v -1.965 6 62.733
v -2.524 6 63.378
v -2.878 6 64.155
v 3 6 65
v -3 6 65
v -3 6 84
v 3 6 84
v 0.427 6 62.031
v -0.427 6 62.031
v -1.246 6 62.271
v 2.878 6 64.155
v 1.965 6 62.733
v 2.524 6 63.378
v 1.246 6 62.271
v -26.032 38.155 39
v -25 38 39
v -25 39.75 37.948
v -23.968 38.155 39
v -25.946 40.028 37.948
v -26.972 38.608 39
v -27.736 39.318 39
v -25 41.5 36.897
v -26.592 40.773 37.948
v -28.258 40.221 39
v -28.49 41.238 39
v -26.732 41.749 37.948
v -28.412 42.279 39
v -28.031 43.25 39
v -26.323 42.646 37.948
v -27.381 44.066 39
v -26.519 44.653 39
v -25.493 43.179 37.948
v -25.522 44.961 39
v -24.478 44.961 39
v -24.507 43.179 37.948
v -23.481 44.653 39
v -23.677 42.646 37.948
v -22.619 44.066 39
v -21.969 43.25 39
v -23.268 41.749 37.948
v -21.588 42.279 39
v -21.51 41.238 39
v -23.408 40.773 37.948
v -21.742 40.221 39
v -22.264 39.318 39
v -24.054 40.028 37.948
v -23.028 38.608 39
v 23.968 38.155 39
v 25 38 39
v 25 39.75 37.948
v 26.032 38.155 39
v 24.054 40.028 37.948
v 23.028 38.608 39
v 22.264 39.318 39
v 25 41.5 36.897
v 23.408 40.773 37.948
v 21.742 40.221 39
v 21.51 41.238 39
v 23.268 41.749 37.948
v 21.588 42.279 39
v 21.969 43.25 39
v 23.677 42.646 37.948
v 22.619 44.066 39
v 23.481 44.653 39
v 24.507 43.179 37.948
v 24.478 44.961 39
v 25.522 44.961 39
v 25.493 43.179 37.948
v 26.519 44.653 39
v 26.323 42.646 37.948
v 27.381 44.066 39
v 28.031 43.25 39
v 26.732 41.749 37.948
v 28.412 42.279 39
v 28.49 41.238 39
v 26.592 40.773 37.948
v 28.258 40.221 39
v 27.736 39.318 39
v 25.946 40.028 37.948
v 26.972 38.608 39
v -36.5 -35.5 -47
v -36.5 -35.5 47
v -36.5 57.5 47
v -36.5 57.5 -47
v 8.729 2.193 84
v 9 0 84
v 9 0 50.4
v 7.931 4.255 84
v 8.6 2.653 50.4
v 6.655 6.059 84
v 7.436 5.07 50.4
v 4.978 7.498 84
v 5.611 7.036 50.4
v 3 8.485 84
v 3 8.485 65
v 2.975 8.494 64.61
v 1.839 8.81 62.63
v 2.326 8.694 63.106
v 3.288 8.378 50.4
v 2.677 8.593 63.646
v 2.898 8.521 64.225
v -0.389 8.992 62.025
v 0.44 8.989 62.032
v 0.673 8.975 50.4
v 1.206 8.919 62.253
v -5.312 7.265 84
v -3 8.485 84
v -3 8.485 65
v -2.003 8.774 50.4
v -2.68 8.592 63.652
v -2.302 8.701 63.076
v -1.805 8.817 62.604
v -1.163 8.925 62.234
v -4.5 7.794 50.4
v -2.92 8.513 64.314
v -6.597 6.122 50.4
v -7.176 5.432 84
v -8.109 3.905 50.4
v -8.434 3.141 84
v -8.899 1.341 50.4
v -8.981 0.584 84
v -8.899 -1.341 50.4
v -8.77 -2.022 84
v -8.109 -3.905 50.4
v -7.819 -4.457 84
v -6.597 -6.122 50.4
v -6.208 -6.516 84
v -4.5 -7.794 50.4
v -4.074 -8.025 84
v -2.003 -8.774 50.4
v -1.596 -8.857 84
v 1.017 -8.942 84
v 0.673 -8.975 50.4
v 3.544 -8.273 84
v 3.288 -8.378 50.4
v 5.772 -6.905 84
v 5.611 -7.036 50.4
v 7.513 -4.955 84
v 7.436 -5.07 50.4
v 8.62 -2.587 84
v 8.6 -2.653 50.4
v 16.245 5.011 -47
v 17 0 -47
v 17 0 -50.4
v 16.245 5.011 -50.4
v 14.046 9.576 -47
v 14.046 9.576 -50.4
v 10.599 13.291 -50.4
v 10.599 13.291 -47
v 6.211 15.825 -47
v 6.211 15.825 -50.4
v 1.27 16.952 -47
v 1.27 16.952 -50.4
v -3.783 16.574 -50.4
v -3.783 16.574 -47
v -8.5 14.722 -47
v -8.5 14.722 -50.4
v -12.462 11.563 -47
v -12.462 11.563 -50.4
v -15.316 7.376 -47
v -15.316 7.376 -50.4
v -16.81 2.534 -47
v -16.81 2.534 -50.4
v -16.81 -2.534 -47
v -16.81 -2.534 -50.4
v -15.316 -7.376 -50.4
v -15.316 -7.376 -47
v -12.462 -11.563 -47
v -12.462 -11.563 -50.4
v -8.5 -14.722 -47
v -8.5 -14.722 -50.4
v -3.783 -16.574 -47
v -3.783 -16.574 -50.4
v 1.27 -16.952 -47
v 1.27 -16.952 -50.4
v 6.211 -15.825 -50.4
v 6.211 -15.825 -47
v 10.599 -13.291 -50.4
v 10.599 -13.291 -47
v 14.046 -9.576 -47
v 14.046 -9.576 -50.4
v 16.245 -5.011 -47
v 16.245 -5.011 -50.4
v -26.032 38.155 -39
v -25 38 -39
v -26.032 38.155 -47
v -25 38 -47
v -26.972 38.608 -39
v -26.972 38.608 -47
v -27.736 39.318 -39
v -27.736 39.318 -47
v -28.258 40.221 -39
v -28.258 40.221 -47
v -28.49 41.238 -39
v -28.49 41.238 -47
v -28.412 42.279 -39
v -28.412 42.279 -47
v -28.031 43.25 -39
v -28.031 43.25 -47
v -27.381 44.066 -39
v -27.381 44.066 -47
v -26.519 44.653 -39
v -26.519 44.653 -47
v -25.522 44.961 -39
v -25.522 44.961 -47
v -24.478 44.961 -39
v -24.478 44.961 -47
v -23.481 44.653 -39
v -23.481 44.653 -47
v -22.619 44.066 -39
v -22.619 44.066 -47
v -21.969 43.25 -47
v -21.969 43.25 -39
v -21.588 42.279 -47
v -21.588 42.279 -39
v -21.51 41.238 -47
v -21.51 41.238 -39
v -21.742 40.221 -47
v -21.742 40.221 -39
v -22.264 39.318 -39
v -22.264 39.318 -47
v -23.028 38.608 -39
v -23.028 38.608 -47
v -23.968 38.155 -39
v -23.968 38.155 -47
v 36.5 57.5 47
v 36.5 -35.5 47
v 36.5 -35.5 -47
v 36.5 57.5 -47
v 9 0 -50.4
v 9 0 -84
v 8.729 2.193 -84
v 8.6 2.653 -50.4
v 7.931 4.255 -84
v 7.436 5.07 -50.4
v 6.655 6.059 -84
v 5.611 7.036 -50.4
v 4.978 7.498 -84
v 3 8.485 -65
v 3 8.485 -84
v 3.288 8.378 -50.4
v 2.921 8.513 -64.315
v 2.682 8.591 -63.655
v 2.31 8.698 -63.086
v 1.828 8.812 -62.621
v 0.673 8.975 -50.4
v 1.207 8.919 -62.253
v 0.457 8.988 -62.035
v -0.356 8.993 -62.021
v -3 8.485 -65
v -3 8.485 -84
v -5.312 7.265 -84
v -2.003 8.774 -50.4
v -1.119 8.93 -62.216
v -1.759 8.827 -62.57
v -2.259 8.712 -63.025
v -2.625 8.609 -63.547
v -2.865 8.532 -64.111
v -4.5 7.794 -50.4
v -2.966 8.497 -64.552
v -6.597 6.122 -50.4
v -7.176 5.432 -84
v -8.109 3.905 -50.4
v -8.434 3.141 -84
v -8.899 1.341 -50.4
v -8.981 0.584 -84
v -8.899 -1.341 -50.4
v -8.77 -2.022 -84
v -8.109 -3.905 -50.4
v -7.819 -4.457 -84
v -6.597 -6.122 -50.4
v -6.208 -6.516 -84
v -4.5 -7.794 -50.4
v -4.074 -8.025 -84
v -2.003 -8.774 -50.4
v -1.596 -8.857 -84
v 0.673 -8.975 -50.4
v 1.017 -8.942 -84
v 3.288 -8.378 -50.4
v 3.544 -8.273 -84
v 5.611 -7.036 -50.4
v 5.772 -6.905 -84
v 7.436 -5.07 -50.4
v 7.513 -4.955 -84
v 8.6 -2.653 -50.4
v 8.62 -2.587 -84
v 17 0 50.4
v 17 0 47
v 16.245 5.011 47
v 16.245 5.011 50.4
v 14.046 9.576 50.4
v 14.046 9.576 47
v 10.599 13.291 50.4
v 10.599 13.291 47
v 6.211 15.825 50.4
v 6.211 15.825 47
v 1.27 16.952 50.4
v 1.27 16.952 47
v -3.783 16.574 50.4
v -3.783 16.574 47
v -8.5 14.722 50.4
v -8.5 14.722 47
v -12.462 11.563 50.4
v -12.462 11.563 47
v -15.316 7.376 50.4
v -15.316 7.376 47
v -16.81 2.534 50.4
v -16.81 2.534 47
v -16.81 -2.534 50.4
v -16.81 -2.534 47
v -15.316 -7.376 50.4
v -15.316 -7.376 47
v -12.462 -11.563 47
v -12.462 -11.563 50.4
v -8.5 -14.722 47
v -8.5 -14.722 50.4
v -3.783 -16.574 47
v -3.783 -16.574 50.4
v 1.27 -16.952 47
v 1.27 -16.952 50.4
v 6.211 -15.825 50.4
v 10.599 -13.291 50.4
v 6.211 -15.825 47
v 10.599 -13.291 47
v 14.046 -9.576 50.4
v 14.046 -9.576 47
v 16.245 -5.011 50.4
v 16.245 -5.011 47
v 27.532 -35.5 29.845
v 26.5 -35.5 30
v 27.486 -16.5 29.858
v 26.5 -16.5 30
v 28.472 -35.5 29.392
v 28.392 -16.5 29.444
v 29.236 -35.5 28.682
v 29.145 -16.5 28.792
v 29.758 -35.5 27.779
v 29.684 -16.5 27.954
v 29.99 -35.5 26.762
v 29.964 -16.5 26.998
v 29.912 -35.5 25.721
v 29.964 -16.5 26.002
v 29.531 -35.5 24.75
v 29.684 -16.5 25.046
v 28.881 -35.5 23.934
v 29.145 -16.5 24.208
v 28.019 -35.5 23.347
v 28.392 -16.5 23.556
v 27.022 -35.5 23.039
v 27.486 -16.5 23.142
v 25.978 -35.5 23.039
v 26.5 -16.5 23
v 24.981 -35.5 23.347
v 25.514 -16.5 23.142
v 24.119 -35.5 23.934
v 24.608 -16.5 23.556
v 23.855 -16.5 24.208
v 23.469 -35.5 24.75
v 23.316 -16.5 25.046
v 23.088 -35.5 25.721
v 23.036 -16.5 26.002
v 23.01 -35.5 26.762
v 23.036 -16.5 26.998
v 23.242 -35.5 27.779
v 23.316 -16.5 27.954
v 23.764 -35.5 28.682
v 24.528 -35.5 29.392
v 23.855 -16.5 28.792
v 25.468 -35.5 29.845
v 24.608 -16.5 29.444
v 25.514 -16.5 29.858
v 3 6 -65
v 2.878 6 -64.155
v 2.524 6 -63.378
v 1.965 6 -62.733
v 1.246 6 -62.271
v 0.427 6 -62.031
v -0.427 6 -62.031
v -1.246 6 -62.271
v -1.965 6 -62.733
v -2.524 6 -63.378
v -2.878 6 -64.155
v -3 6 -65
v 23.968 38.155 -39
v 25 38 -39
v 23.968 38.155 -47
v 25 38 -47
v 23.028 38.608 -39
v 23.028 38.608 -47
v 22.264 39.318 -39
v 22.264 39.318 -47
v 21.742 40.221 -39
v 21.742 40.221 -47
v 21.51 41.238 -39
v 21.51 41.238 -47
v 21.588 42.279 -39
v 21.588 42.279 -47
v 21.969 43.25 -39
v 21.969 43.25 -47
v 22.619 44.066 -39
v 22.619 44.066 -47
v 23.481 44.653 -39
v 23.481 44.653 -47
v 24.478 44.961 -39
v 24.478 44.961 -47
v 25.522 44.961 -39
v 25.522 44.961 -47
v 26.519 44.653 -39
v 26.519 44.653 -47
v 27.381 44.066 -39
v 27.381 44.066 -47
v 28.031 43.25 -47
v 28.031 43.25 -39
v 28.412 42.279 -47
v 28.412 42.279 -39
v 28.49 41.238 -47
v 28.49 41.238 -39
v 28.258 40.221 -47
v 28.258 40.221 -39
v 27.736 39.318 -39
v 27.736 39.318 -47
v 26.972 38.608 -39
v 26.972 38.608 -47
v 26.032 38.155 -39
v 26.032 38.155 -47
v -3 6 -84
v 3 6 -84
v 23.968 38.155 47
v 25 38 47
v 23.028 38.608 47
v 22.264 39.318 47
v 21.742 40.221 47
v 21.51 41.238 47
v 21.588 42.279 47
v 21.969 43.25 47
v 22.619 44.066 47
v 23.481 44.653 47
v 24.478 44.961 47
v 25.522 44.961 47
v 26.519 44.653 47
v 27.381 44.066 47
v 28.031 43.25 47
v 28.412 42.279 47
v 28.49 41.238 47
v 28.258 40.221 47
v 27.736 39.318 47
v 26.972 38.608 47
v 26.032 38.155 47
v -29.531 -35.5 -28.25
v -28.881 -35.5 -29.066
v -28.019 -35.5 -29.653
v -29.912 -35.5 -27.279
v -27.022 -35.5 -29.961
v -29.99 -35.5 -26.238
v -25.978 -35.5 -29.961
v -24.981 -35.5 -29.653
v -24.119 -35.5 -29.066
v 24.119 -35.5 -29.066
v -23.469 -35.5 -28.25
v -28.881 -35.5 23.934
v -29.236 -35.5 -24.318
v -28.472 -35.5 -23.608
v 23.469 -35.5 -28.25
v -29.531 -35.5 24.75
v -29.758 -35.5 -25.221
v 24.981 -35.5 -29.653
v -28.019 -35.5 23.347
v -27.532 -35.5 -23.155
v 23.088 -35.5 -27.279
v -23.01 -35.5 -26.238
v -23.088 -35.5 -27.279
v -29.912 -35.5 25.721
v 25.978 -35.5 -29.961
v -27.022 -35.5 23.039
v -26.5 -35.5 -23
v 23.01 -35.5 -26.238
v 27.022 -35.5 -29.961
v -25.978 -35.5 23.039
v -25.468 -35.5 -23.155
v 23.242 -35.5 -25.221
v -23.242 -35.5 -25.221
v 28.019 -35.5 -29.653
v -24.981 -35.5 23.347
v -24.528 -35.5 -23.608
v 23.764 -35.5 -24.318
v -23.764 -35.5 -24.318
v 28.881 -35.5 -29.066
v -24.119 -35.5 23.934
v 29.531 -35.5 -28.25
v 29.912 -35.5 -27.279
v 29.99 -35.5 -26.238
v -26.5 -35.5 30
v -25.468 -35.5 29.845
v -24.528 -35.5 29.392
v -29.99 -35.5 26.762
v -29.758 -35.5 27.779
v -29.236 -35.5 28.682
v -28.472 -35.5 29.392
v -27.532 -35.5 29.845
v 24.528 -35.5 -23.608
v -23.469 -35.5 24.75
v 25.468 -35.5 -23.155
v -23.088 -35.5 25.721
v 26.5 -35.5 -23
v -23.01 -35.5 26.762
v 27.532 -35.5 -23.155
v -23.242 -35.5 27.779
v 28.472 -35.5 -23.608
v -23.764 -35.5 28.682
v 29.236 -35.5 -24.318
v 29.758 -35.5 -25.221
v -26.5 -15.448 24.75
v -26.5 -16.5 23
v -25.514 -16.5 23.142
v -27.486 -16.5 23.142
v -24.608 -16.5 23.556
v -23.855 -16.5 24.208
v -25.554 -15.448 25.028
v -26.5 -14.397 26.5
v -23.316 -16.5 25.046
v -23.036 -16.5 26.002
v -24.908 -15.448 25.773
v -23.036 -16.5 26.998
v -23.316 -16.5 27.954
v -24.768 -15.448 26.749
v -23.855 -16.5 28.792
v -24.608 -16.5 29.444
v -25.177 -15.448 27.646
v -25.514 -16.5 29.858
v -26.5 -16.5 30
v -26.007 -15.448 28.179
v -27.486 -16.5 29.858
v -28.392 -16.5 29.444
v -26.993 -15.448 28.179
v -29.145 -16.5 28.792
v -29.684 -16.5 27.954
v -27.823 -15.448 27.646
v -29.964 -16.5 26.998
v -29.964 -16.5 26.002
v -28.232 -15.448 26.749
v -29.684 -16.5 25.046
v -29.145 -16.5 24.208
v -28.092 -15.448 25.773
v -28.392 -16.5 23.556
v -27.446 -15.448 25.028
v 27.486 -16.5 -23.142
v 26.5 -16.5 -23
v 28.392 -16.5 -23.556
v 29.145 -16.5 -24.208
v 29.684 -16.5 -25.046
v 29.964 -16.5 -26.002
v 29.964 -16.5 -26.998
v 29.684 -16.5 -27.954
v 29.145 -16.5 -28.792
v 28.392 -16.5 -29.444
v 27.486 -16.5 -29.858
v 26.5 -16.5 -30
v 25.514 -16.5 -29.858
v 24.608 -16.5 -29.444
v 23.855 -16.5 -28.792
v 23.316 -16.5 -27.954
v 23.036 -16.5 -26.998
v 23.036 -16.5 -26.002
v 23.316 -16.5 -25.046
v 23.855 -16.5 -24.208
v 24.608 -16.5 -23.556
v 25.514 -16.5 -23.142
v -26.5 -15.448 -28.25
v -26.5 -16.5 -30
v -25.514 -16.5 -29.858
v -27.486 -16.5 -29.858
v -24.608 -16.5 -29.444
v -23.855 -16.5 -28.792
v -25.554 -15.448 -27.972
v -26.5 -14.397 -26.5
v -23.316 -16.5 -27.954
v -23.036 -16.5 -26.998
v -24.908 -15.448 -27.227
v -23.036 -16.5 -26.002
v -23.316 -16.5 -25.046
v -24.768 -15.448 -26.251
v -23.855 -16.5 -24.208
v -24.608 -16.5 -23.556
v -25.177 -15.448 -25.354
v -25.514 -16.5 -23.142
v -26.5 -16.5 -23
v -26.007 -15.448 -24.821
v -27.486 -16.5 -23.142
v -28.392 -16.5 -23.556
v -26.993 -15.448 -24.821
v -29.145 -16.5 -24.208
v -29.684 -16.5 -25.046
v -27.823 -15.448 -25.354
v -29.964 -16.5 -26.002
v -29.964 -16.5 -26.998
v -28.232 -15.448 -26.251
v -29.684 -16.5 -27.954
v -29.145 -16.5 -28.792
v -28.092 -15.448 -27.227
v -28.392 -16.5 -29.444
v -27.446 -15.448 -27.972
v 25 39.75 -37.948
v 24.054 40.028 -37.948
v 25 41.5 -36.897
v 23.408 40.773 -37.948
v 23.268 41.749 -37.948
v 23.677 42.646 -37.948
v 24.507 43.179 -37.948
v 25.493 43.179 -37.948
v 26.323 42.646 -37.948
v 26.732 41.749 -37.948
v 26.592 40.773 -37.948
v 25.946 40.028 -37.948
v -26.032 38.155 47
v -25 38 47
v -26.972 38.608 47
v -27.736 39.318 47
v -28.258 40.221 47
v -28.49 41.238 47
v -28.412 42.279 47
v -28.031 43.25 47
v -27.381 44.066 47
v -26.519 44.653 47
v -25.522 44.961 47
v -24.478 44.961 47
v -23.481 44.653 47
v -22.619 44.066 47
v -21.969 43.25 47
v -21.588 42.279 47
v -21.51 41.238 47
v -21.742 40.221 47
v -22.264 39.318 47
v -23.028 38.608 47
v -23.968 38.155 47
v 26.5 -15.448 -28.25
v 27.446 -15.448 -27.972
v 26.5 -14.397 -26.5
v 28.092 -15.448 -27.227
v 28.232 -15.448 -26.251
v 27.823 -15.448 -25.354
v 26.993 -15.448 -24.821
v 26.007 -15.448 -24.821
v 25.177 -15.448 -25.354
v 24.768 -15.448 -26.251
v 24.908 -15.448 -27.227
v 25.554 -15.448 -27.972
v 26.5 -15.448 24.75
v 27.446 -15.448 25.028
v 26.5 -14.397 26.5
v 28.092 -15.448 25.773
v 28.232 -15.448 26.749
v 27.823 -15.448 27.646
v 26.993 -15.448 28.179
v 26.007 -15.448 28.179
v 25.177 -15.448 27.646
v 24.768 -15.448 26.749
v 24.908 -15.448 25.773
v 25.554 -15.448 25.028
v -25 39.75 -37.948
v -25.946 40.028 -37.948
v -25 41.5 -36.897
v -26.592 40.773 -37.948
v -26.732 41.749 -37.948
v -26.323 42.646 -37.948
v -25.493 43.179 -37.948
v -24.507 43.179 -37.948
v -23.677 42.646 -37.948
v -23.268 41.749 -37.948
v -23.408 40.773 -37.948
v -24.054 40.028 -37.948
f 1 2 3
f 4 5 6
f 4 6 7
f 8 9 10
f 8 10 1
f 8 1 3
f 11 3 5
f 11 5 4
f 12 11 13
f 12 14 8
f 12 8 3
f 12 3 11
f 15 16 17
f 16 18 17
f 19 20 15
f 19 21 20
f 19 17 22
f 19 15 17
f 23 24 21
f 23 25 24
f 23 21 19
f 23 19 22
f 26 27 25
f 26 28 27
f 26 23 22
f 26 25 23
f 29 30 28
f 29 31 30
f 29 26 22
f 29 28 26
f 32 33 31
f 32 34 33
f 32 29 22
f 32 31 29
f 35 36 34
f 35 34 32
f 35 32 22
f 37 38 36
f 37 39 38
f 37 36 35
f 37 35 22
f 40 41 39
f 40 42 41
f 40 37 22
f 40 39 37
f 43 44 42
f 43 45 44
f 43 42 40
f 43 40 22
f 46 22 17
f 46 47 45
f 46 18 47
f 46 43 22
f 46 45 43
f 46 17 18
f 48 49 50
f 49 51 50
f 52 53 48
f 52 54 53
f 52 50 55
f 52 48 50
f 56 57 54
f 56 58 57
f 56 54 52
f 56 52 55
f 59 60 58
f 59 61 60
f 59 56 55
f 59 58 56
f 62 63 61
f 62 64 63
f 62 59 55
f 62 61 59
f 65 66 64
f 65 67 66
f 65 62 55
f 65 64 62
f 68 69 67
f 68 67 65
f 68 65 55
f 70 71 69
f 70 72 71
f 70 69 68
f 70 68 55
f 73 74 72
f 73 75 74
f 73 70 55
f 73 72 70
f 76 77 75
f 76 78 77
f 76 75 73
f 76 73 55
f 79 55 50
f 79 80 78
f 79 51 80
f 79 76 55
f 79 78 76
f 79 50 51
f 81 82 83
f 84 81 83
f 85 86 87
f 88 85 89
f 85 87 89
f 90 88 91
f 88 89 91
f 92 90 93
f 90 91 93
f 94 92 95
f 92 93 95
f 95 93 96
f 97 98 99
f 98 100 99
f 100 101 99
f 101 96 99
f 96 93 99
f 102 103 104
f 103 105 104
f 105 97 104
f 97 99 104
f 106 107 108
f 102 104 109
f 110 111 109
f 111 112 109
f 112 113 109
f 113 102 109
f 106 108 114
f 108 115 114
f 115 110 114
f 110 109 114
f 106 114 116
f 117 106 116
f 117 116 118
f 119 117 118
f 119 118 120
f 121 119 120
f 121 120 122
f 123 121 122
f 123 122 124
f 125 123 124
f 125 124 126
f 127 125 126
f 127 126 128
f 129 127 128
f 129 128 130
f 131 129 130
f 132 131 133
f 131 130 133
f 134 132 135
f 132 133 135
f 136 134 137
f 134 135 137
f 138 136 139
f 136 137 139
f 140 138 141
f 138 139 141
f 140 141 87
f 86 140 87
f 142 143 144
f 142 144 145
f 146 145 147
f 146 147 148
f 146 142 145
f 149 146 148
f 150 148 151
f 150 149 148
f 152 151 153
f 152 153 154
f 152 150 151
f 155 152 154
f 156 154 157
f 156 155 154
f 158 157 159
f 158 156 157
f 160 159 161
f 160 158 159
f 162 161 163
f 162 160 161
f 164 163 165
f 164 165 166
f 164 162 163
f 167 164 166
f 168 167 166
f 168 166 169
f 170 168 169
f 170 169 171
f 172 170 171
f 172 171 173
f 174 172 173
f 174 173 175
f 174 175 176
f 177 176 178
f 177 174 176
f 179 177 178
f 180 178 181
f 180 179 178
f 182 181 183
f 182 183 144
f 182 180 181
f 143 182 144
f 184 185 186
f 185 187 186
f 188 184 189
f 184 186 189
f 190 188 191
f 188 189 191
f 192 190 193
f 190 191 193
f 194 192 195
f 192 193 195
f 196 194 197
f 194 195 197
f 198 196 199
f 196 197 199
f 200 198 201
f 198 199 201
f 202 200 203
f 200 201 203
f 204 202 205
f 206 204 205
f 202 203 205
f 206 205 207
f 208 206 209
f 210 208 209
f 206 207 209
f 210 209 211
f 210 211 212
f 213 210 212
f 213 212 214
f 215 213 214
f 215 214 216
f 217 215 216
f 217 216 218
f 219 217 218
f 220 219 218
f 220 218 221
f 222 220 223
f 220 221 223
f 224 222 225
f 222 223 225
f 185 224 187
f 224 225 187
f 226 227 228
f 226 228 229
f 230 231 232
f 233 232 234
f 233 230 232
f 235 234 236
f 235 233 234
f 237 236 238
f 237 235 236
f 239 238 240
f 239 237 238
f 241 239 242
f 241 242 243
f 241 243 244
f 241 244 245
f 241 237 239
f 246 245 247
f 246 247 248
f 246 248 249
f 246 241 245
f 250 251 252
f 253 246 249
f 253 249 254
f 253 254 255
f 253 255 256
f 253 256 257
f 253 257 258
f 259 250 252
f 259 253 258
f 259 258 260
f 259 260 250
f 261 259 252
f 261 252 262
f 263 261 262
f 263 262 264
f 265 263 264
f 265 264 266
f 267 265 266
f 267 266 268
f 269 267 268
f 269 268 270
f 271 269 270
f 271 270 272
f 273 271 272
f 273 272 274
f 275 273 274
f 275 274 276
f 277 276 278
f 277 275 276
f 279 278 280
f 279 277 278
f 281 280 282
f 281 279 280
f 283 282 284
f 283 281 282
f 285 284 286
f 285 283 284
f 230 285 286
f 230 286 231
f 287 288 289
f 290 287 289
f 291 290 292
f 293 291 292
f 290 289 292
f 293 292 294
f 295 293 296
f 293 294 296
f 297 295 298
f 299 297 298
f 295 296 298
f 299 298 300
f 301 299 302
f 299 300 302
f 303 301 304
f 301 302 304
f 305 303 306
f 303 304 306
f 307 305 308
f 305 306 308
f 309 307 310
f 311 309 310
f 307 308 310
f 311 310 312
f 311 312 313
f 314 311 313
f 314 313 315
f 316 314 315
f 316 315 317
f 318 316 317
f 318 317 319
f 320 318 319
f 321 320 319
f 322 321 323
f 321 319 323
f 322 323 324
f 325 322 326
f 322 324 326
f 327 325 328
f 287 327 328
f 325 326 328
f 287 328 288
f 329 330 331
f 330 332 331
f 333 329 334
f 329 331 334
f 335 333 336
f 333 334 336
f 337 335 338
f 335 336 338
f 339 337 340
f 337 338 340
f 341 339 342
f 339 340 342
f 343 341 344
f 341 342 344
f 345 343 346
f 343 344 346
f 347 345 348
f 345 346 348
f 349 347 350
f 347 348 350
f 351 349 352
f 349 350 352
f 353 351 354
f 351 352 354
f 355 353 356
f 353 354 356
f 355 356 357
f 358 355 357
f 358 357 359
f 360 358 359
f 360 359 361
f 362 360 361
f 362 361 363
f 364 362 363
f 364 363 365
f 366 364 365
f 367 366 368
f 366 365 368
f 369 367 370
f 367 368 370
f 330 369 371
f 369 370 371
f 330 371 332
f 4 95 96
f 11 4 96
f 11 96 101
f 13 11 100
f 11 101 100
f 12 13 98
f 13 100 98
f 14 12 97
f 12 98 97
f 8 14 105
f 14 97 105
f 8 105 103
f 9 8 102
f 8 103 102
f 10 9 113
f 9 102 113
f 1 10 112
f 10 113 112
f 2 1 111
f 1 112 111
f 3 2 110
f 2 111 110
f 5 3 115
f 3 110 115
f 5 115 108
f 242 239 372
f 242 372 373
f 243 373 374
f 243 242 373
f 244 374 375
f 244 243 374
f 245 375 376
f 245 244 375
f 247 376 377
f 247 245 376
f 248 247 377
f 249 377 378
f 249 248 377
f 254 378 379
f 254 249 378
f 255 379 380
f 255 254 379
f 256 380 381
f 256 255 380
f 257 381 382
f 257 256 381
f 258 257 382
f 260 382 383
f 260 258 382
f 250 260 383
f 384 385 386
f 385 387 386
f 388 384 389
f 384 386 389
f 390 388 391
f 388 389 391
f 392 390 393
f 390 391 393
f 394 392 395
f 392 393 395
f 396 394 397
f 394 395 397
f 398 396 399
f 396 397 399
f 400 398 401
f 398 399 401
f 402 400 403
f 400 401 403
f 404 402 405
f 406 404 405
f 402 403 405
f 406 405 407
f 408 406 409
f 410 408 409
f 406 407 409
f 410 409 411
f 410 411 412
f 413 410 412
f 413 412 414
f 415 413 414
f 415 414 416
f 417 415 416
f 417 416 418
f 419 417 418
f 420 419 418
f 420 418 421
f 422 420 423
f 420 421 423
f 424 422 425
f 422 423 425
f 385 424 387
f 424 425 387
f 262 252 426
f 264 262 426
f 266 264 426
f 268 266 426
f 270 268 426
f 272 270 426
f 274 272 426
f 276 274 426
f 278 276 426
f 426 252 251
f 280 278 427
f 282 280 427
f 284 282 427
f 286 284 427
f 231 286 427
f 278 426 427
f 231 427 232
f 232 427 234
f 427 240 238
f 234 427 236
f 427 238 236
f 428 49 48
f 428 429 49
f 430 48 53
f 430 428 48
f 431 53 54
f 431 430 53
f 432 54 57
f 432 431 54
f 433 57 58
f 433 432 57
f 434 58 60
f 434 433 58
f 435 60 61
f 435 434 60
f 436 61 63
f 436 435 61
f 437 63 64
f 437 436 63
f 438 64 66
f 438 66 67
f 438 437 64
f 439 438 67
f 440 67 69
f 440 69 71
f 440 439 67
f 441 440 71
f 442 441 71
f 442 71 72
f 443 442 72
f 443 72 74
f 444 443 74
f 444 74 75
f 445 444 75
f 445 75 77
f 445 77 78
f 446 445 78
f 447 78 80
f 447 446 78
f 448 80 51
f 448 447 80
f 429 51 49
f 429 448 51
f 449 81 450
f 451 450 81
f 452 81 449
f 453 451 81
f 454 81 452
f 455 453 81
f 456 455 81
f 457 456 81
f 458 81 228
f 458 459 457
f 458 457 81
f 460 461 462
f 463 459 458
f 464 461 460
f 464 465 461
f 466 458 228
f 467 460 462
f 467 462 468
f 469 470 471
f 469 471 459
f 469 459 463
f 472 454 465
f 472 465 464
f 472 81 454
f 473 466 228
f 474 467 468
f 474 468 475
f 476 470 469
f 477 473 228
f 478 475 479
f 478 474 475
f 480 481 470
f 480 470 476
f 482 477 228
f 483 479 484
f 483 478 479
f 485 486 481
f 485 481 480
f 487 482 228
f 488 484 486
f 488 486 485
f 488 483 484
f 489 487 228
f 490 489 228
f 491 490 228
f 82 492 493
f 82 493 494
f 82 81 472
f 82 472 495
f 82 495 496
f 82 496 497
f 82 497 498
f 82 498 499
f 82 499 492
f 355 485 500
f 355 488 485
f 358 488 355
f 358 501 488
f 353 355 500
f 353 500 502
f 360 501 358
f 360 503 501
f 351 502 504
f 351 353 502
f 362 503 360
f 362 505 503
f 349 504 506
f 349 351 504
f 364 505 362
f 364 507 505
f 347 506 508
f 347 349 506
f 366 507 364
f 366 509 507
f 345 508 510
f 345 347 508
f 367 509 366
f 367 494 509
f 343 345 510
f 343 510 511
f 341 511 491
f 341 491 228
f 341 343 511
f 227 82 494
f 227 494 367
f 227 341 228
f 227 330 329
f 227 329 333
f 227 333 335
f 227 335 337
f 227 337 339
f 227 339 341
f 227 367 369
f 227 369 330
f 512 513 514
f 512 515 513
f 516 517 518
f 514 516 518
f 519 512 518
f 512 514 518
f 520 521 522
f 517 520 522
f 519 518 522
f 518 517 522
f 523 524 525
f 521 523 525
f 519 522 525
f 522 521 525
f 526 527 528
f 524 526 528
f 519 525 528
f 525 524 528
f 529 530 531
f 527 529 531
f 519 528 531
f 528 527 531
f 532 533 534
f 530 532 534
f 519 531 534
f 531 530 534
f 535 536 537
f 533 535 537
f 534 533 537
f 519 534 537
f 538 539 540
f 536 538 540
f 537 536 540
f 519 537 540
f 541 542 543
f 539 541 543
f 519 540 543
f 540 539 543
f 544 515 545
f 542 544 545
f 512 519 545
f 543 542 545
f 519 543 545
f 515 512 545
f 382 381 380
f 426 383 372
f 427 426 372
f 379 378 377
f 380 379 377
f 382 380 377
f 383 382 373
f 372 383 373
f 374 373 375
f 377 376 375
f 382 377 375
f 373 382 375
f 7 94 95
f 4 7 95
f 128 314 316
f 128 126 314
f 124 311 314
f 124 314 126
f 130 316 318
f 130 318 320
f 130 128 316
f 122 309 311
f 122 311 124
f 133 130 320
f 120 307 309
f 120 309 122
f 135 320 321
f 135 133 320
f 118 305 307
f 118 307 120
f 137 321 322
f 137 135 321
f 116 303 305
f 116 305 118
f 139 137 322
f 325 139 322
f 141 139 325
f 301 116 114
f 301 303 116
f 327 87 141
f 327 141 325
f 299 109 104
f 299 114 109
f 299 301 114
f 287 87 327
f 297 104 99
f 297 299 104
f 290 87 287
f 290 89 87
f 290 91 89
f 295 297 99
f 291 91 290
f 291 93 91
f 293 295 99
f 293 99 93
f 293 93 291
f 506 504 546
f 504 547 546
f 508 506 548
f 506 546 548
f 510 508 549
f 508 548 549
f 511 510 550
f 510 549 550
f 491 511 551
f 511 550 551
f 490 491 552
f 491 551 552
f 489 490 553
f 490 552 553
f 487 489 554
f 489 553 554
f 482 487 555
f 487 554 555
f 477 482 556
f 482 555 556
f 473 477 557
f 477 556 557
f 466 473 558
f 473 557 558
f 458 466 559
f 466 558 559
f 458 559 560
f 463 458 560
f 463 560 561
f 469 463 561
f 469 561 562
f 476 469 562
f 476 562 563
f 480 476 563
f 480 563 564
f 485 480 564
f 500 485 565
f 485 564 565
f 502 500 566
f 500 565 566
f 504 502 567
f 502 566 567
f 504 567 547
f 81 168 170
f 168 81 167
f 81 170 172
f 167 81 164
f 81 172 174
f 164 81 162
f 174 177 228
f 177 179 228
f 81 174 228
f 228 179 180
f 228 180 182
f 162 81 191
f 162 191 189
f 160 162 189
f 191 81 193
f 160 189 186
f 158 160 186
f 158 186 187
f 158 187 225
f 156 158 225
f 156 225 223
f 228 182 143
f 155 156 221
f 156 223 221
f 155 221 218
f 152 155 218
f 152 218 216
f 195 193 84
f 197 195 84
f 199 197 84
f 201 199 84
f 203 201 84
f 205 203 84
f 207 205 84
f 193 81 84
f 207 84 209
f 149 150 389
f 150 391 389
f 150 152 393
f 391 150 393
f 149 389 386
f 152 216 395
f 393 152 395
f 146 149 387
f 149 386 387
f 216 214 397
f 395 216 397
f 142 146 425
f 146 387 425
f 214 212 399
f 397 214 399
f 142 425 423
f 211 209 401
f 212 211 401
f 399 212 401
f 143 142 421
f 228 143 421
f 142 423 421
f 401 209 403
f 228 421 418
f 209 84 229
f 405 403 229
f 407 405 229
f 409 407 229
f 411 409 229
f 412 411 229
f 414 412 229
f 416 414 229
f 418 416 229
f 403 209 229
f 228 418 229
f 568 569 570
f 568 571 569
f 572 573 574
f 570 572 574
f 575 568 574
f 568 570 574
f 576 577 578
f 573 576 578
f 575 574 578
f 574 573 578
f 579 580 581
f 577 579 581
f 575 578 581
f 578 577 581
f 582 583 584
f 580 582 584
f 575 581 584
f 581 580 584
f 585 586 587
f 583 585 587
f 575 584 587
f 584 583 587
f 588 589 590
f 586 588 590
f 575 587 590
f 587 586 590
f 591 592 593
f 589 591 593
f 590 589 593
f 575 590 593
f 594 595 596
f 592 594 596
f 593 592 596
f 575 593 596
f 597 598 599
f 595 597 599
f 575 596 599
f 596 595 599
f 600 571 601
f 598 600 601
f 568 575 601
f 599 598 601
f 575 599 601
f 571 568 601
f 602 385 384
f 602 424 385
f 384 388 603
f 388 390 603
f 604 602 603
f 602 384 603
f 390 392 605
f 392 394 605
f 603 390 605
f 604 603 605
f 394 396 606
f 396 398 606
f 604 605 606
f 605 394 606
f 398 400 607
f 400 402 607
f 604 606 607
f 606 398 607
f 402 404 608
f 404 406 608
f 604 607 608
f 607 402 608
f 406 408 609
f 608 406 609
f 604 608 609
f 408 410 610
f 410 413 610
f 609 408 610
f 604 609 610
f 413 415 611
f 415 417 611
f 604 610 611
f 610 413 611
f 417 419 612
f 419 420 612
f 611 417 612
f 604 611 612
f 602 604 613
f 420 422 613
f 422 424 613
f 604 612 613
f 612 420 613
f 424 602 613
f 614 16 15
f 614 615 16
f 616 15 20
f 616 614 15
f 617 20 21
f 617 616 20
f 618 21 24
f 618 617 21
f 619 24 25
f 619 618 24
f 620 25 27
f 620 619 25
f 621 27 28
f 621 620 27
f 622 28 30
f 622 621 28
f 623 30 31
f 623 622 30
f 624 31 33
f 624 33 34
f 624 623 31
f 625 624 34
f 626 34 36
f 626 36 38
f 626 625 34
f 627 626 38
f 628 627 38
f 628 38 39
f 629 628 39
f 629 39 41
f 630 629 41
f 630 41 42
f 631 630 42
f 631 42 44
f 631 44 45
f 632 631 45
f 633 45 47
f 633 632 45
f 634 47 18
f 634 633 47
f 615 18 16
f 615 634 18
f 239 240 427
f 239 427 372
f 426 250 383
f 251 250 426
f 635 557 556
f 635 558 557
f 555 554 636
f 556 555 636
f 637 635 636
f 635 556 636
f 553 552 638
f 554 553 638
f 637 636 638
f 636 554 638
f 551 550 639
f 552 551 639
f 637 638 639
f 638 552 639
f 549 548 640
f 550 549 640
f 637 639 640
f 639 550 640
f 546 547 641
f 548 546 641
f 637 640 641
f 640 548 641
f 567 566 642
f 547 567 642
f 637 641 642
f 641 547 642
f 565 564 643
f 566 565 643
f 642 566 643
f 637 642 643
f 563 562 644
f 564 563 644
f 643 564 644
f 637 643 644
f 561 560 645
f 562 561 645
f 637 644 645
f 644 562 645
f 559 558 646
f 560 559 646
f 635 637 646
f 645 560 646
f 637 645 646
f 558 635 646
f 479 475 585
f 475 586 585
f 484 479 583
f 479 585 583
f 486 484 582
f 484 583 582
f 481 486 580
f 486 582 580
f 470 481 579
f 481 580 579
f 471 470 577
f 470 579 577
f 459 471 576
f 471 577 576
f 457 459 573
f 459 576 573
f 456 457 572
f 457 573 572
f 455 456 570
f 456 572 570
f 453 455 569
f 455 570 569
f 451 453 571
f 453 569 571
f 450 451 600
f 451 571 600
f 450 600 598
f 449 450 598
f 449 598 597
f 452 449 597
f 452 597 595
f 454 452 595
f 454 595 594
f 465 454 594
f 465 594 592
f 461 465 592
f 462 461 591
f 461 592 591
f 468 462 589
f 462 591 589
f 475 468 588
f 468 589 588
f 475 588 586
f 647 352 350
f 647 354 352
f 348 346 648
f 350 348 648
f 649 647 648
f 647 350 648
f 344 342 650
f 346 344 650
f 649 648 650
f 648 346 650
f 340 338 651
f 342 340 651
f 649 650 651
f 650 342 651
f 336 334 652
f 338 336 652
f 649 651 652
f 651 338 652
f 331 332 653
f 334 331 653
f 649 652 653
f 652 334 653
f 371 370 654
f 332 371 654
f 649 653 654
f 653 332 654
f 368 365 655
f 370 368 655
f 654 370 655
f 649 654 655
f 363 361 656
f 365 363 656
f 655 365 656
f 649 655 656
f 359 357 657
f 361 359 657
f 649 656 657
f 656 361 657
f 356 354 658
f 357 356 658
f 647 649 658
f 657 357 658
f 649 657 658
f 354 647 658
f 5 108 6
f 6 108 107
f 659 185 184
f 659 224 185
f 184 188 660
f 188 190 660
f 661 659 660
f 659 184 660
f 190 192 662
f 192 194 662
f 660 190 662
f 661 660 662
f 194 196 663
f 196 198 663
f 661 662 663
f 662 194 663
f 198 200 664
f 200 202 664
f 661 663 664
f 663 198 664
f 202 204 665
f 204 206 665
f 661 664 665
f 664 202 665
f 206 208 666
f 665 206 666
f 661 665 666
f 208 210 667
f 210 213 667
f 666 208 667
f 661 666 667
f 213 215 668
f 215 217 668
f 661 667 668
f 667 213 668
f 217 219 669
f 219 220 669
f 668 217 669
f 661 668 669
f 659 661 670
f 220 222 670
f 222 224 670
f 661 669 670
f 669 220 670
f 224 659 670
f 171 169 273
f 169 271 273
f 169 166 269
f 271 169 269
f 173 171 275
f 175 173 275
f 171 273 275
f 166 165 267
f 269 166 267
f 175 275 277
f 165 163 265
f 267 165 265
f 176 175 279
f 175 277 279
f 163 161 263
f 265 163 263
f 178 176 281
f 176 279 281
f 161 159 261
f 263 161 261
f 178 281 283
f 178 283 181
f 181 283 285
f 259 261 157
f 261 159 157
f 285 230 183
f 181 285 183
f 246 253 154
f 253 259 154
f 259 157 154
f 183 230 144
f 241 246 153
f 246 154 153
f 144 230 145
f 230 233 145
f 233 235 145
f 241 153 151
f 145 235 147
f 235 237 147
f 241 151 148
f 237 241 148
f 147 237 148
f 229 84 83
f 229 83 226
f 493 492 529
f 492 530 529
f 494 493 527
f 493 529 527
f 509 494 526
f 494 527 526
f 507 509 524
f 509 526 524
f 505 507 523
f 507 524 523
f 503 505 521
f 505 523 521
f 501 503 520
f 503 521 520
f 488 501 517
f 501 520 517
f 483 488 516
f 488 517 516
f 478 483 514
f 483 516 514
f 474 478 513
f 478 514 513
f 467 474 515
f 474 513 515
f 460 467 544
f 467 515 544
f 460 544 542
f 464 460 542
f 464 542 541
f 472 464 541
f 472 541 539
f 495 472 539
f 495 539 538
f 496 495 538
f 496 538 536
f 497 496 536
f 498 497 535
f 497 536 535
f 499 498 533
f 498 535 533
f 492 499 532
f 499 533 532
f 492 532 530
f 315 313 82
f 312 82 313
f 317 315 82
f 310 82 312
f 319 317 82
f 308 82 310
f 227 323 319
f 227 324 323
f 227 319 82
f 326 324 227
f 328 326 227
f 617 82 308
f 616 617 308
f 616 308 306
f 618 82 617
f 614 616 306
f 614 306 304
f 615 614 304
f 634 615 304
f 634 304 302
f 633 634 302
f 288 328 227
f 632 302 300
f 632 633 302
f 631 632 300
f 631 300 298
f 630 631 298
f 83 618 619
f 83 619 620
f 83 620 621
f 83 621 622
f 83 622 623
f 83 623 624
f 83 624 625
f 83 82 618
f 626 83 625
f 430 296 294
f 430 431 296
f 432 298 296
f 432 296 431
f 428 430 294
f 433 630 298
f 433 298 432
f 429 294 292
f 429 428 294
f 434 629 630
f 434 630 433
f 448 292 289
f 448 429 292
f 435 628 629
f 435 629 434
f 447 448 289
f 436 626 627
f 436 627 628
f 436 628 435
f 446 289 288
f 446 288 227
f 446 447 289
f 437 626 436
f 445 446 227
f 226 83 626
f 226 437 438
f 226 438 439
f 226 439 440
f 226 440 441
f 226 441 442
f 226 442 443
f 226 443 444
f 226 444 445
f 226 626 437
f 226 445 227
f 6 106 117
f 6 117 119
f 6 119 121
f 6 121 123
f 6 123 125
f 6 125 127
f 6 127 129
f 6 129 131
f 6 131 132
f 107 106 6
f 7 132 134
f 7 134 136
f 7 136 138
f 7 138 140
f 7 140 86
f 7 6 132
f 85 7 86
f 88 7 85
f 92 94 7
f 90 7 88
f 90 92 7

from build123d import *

# Parameters (mm, degrees)
SKETCH1_W                      = 73
SKETCH1_H                      = 93
BOSS_EXTRUDE1_DEPTH            = 47
SKETCH2_R                      = 17
BOSS_EXTRUDE2_DEPTH            = 3.4
SKETCH3_R                      = 9
BOSS_EXTRUDE3_DEPTH            = 33.6
SKETCH4_R                      = 3
CUT_EXTRUDE1_DEPTH             = 3
M8X1_0_TAPPED_HOLE1_AT_2_COUNT = 2
M8X1_0_TAPPED_HOLE1_AT_2_PITCH = 50
M8X1_0_TAPPED_HOLE2_D          = 7
M8X1_0_TAPPED_HOLE2_DEPTH      = 19
M8X1_0_TAPPED_HOLE2_TIP        = 2.103012167


with BuildPart() as part:
    # Sketch1 → Boss-Extrude1 (new, symmetric)
    with BuildSketch(Plane.XY):
        with Locations((0, 11)):
            Rectangle(SKETCH1_W, SKETCH1_H)
    extrude(amount=BOSS_EXTRUDE1_DEPTH, both=True)

    # Sketch2 → Boss-Extrude2 (add)
    with BuildSketch(Plane.XY.offset(47)):
        Circle(SKETCH2_R)
    boss_extrude2 = extrude(amount=BOSS_EXTRUDE2_DEPTH)

    # Sketch3 → Boss-Extrude3 (add)
    with BuildSketch(Plane.XY.offset(50.4)):
        Circle(SKETCH3_R)
    boss_extrude3 = extrude(amount=BOSS_EXTRUDE3_DEPTH)

    # Sketch4 → Cut-Extrude1 (cut)
    with BuildSketch(Plane(origin=(0, 9, 0), x_dir=(1, 0, 0), z_dir=(0, 1, 0))):
        with BuildLine():
            ThreePointArc((3, -65), (0, -68), (-3, -65))
            Line((-3, -65), (-3, -84))
            Line((-3, -84), (3, -84))
            Line((3, -84), (3, -65))
        make_face()
        with Locations((0, -65)):
            Circle(SKETCH4_R)
    cut_extrude1 = extrude(amount=-CUT_EXTRUDE1_DEPTH, mode=Mode.SUBTRACT)

    # Sketch6 → M8x1.0 Tapped Hole1 (revolve, cut)
    with BuildSketch(Plane(origin=(-25, 41.5, 47), x_dir=(0, -1, 0), z_dir=(1, 0, 0))):
        Polygon((0, 0), (0, 10.103012167), (3.5, 8), (3.5, 0), align=None)
    m8x1_0_tapped_hole1 = revolve(axis=Axis((-25, 41.5, 53.35), (0, 0, -1)), mode=Mode.SUBTRACT)

    # M8x1.0 Tapped Hole1 at 2: M8x1.0 Tapped Hole1 ×2
    with Locations(*[(i * M8X1_0_TAPPED_HOLE1_AT_2_PITCH, 0, 0) for i in range(1, M8X1_0_TAPPED_HOLE1_AT_2_COUNT)]):
        add(m8x1_0_tapped_hole1, mode=Mode.SUBTRACT)

    # Mirror1: Boss-Extrude2, Boss-Extrude3, Cut-Extrude1, M8x1.0 Tapped Hole1 across plane
    add(boss_extrude2.mirror(Plane.XY))
    add(boss_extrude3.mirror(Plane.XY))
    add(cut_extrude1.mirror(Plane.XY), mode=Mode.SUBTRACT)
    add(m8x1_0_tapped_hole1.mirror(Plane.XY), mode=Mode.SUBTRACT)

    # Mirror1 copy 1 sketch → Mirror1 copy 1 (revolve, cut)
    with BuildSketch(Plane(origin=(25, 41.5, -47), x_dir=(0, -1, 0), z_dir=(1, 0, 0))):
        Polygon((0, 0), (0, -10.103012167), (3.5, -8), (3.5, 0), align=None)
    revolve(axis=Axis((25, 41.5, -53.35), (0, 0, -1)), mode=Mode.SUBTRACT)

    # M8x1.0 Tapped Hole2
    with Locations(Plane(origin=(26.5, -35.5, 26.5), x_dir=(0, 0, -1), z_dir=(0, -1, 0))):
        with Locations((0, 0), (53, 0), (53, -53), (0, -53)):
            Hole(M8X1_0_TAPPED_HOLE2_D / 2, depth=M8X1_0_TAPPED_HOLE2_DEPTH)
            with Locations((0, 0, -(M8X1_0_TAPPED_HOLE2_DEPTH + M8X1_0_TAPPED_HOLE2_TIP / 2))):  # 118° drill point
                Cone(0, M8X1_0_TAPPED_HOLE2_D / 2, M8X1_0_TAPPED_HOLE2_TIP, mode=Mode.SUBTRACT)


solid = part.part
